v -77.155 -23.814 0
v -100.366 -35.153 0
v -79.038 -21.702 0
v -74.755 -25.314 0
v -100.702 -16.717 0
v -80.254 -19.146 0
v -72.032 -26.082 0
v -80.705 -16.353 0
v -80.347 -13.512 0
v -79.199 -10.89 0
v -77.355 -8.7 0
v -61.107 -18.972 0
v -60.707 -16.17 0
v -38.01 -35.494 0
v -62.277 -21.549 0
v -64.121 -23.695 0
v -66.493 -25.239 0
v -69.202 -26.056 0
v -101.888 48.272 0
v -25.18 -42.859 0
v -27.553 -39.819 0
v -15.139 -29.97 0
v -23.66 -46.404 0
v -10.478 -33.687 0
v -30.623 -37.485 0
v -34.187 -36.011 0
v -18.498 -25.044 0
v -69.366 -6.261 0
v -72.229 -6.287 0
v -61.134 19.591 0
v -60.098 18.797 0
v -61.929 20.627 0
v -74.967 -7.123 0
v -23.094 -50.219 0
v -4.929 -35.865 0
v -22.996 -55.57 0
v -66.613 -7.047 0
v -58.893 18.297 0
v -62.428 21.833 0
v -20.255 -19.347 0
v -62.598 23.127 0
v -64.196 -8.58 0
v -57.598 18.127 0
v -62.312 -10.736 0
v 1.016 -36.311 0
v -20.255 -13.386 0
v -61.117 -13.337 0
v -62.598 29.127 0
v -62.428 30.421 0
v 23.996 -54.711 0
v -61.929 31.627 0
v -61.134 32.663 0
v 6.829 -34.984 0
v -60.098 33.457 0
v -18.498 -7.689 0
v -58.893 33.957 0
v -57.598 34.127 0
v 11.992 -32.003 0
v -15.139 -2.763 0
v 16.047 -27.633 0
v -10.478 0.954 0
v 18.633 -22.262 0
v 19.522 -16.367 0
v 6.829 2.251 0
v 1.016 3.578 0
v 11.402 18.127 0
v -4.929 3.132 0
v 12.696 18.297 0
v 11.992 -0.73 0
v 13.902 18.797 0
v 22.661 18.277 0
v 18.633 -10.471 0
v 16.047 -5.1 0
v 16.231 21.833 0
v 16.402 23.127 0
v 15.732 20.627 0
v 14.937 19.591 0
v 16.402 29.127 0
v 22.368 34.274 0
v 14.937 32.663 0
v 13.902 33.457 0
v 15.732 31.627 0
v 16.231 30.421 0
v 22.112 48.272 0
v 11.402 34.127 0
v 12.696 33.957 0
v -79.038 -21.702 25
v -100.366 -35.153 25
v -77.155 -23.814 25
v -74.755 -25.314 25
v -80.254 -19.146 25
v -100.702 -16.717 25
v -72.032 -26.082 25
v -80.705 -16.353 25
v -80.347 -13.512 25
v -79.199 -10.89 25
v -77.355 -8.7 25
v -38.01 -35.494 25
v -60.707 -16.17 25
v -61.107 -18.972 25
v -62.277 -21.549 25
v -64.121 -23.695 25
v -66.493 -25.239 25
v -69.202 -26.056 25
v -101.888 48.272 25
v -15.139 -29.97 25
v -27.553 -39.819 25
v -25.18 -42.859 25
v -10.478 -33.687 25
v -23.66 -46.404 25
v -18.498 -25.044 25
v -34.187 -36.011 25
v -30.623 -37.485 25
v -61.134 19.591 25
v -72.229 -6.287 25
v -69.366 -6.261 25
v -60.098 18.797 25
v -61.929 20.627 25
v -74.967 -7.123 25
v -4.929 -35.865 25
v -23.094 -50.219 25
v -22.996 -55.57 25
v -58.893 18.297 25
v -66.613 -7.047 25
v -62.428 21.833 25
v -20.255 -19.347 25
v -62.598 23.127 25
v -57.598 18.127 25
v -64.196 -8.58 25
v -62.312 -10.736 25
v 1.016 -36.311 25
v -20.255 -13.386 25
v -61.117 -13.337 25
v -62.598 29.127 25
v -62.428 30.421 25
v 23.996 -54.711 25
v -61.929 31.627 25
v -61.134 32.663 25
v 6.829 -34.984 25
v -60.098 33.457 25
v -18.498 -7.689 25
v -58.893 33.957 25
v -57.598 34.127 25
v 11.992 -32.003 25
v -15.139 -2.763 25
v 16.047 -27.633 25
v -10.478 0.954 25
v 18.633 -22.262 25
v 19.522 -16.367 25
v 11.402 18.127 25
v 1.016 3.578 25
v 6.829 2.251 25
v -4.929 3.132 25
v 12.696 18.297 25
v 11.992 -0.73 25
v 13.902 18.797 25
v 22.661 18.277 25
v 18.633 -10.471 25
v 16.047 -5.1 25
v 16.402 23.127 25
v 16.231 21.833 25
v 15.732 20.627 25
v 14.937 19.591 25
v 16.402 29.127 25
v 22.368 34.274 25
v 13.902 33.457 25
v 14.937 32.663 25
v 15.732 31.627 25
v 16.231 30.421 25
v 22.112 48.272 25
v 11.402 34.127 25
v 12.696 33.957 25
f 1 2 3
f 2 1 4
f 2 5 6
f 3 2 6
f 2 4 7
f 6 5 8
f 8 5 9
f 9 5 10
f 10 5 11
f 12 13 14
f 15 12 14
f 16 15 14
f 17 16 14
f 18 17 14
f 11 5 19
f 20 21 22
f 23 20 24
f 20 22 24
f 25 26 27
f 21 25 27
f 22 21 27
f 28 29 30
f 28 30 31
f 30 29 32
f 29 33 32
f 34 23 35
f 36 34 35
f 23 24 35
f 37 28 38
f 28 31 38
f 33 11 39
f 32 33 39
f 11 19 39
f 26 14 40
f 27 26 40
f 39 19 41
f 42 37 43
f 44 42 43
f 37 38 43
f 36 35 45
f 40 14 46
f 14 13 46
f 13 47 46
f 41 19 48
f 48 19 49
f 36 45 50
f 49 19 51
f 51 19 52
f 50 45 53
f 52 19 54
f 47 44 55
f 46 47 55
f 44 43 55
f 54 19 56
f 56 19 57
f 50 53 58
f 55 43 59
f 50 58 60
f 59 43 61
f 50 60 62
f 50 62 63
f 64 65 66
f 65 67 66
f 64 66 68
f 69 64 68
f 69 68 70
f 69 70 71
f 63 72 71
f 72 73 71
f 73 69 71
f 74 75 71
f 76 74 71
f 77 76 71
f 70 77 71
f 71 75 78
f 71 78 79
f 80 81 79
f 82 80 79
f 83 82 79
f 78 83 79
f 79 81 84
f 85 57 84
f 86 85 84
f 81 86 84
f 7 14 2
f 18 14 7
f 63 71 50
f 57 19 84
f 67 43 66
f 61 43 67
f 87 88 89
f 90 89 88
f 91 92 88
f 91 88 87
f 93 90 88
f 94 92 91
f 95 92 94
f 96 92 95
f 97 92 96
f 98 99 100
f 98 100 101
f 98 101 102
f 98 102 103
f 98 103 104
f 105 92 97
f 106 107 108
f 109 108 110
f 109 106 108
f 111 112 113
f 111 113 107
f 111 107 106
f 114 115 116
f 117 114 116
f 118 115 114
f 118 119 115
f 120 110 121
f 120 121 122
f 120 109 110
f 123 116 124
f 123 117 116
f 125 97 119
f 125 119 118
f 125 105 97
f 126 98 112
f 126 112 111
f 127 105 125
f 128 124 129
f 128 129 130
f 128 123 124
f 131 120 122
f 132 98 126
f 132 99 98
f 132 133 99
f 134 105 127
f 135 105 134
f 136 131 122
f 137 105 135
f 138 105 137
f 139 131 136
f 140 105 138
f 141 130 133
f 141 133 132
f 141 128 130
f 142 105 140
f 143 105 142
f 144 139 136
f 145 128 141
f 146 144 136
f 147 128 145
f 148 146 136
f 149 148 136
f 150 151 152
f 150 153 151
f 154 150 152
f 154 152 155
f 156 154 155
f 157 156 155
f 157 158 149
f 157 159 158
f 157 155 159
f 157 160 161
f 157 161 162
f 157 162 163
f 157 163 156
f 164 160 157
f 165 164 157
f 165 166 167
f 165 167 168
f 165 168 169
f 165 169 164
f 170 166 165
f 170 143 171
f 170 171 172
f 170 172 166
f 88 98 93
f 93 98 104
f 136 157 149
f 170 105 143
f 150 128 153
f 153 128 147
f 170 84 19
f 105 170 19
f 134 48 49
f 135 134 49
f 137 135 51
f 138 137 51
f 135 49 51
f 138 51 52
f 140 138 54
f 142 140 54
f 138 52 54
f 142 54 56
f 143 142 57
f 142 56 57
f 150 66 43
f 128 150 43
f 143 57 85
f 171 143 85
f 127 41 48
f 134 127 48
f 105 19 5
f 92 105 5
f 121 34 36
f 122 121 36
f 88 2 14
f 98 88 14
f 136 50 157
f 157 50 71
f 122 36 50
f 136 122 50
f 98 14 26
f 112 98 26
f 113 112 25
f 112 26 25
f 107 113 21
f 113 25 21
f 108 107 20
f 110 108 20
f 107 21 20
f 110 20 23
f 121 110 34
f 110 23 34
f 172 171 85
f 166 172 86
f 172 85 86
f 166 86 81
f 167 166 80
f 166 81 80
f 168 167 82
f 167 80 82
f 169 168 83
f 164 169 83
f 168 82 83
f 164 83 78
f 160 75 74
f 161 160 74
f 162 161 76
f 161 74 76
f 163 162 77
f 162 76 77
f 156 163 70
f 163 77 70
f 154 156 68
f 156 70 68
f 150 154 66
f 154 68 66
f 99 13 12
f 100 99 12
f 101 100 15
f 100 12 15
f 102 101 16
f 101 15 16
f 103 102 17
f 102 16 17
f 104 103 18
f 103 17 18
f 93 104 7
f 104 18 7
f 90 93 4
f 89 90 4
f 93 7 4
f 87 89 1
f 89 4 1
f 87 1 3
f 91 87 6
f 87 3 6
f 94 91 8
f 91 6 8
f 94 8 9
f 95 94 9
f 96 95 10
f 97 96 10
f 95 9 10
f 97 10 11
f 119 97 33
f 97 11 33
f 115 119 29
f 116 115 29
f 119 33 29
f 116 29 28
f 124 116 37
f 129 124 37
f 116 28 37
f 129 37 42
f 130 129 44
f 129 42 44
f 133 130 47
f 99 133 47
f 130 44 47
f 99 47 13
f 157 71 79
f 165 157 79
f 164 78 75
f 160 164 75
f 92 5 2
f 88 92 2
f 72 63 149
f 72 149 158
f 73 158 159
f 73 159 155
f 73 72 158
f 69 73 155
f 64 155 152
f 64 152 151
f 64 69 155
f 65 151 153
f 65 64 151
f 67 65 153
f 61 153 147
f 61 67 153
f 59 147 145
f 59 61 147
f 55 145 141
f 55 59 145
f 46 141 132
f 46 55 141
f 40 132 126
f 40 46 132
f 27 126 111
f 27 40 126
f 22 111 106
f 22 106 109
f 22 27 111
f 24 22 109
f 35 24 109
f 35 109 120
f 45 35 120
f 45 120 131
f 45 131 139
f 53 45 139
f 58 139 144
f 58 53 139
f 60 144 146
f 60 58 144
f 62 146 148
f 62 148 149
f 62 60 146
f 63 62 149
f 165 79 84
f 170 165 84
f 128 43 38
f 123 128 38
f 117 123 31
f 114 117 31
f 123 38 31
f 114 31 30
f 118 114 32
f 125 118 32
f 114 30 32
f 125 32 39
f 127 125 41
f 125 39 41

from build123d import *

# Parameters (mm, degrees)
F0_R     = 20
F1_DEPTH = 25


with BuildPart() as f1:
    # F0 (on Top) → F1 (new body)
    with BuildSketch(Plane.XY):
        with BuildLine():
            ThreePointArc((-60.707048, -16.170189), (-70.798248, -6.170605), (-80.705385, -16.352581))
            ThreePointArc((-80.705385, -16.352581), (-70.615848, -26.169773), (-60.707048, -16.170189))
        make_face()
        with BuildLine():
            Line((17.155273, 48.271821), (-101.887608, 48.271821))
            Line((-101.887608, 48.271821), (-100.702058, -16.717366))
            Line((-100.702058, -16.717366), (-100.365747, -35.153195))
            Line((-100.365747, -35.153195), (-38.009589, -35.493795))
            ThreePointArc((-38.009589, -35.493795), (-27.553158, -39.819167), (-23.094029, -50.219261))
            Line((-23.094029, -50.219261), (-22.996154, -55.570459))
            Line((-22.996154, -55.570459), (23.995987, -54.710954))
            Line((23.995987, -54.710954), (22.661012, 18.276838))
            Line((22.661012, 18.276838), (22.368415, 34.274162))
            Line((22.368415, 34.274162), (22.112392, 48.271821))
            Line((22.112392, 48.271821), (17.155273, 48.271821))
        make_face()
        with BuildLine():
            ThreePointArc((-60.707048, -16.170189), (-70.615848, -26.169773), (-80.705385, -16.352581))
            ThreePointArc((-80.705385, -16.352581), (-70.798248, -6.170605), (-60.707048, -16.170189))
        make_face(mode=Mode.SUBTRACT)
        with Locations((-0.478208, -16.36657)):
            Circle(F0_R, mode=Mode.SUBTRACT)
        with BuildLine():
            ThreePointArc((11.401503, 34.126978), (14.937037, 32.662512), (16.401503, 29.126978))
            Line((16.401503, 29.126978), (16.401503, 23.126978))
            ThreePointArc((16.401503, 23.126978), (14.937037, 19.591444), (11.401503, 18.126978))
            Line((11.401503, 18.126978), (-57.598497, 18.126978))
            ThreePointArc((-57.598497, 18.126978), (-61.134031, 19.591444), (-62.598497, 23.126978))
            Line((-62.598497, 23.126978), (-62.598497, 29.126978))
            ThreePointArc((-62.598497, 29.126978), (-61.134031, 32.662512), (-57.598497, 34.126978))
            Line((-57.598497, 34.126978), (11.401503, 34.126978))
        make_face(mode=Mode.SUBTRACT)
    extrude(amount=F1_DEPTH)


solid = f1.part
